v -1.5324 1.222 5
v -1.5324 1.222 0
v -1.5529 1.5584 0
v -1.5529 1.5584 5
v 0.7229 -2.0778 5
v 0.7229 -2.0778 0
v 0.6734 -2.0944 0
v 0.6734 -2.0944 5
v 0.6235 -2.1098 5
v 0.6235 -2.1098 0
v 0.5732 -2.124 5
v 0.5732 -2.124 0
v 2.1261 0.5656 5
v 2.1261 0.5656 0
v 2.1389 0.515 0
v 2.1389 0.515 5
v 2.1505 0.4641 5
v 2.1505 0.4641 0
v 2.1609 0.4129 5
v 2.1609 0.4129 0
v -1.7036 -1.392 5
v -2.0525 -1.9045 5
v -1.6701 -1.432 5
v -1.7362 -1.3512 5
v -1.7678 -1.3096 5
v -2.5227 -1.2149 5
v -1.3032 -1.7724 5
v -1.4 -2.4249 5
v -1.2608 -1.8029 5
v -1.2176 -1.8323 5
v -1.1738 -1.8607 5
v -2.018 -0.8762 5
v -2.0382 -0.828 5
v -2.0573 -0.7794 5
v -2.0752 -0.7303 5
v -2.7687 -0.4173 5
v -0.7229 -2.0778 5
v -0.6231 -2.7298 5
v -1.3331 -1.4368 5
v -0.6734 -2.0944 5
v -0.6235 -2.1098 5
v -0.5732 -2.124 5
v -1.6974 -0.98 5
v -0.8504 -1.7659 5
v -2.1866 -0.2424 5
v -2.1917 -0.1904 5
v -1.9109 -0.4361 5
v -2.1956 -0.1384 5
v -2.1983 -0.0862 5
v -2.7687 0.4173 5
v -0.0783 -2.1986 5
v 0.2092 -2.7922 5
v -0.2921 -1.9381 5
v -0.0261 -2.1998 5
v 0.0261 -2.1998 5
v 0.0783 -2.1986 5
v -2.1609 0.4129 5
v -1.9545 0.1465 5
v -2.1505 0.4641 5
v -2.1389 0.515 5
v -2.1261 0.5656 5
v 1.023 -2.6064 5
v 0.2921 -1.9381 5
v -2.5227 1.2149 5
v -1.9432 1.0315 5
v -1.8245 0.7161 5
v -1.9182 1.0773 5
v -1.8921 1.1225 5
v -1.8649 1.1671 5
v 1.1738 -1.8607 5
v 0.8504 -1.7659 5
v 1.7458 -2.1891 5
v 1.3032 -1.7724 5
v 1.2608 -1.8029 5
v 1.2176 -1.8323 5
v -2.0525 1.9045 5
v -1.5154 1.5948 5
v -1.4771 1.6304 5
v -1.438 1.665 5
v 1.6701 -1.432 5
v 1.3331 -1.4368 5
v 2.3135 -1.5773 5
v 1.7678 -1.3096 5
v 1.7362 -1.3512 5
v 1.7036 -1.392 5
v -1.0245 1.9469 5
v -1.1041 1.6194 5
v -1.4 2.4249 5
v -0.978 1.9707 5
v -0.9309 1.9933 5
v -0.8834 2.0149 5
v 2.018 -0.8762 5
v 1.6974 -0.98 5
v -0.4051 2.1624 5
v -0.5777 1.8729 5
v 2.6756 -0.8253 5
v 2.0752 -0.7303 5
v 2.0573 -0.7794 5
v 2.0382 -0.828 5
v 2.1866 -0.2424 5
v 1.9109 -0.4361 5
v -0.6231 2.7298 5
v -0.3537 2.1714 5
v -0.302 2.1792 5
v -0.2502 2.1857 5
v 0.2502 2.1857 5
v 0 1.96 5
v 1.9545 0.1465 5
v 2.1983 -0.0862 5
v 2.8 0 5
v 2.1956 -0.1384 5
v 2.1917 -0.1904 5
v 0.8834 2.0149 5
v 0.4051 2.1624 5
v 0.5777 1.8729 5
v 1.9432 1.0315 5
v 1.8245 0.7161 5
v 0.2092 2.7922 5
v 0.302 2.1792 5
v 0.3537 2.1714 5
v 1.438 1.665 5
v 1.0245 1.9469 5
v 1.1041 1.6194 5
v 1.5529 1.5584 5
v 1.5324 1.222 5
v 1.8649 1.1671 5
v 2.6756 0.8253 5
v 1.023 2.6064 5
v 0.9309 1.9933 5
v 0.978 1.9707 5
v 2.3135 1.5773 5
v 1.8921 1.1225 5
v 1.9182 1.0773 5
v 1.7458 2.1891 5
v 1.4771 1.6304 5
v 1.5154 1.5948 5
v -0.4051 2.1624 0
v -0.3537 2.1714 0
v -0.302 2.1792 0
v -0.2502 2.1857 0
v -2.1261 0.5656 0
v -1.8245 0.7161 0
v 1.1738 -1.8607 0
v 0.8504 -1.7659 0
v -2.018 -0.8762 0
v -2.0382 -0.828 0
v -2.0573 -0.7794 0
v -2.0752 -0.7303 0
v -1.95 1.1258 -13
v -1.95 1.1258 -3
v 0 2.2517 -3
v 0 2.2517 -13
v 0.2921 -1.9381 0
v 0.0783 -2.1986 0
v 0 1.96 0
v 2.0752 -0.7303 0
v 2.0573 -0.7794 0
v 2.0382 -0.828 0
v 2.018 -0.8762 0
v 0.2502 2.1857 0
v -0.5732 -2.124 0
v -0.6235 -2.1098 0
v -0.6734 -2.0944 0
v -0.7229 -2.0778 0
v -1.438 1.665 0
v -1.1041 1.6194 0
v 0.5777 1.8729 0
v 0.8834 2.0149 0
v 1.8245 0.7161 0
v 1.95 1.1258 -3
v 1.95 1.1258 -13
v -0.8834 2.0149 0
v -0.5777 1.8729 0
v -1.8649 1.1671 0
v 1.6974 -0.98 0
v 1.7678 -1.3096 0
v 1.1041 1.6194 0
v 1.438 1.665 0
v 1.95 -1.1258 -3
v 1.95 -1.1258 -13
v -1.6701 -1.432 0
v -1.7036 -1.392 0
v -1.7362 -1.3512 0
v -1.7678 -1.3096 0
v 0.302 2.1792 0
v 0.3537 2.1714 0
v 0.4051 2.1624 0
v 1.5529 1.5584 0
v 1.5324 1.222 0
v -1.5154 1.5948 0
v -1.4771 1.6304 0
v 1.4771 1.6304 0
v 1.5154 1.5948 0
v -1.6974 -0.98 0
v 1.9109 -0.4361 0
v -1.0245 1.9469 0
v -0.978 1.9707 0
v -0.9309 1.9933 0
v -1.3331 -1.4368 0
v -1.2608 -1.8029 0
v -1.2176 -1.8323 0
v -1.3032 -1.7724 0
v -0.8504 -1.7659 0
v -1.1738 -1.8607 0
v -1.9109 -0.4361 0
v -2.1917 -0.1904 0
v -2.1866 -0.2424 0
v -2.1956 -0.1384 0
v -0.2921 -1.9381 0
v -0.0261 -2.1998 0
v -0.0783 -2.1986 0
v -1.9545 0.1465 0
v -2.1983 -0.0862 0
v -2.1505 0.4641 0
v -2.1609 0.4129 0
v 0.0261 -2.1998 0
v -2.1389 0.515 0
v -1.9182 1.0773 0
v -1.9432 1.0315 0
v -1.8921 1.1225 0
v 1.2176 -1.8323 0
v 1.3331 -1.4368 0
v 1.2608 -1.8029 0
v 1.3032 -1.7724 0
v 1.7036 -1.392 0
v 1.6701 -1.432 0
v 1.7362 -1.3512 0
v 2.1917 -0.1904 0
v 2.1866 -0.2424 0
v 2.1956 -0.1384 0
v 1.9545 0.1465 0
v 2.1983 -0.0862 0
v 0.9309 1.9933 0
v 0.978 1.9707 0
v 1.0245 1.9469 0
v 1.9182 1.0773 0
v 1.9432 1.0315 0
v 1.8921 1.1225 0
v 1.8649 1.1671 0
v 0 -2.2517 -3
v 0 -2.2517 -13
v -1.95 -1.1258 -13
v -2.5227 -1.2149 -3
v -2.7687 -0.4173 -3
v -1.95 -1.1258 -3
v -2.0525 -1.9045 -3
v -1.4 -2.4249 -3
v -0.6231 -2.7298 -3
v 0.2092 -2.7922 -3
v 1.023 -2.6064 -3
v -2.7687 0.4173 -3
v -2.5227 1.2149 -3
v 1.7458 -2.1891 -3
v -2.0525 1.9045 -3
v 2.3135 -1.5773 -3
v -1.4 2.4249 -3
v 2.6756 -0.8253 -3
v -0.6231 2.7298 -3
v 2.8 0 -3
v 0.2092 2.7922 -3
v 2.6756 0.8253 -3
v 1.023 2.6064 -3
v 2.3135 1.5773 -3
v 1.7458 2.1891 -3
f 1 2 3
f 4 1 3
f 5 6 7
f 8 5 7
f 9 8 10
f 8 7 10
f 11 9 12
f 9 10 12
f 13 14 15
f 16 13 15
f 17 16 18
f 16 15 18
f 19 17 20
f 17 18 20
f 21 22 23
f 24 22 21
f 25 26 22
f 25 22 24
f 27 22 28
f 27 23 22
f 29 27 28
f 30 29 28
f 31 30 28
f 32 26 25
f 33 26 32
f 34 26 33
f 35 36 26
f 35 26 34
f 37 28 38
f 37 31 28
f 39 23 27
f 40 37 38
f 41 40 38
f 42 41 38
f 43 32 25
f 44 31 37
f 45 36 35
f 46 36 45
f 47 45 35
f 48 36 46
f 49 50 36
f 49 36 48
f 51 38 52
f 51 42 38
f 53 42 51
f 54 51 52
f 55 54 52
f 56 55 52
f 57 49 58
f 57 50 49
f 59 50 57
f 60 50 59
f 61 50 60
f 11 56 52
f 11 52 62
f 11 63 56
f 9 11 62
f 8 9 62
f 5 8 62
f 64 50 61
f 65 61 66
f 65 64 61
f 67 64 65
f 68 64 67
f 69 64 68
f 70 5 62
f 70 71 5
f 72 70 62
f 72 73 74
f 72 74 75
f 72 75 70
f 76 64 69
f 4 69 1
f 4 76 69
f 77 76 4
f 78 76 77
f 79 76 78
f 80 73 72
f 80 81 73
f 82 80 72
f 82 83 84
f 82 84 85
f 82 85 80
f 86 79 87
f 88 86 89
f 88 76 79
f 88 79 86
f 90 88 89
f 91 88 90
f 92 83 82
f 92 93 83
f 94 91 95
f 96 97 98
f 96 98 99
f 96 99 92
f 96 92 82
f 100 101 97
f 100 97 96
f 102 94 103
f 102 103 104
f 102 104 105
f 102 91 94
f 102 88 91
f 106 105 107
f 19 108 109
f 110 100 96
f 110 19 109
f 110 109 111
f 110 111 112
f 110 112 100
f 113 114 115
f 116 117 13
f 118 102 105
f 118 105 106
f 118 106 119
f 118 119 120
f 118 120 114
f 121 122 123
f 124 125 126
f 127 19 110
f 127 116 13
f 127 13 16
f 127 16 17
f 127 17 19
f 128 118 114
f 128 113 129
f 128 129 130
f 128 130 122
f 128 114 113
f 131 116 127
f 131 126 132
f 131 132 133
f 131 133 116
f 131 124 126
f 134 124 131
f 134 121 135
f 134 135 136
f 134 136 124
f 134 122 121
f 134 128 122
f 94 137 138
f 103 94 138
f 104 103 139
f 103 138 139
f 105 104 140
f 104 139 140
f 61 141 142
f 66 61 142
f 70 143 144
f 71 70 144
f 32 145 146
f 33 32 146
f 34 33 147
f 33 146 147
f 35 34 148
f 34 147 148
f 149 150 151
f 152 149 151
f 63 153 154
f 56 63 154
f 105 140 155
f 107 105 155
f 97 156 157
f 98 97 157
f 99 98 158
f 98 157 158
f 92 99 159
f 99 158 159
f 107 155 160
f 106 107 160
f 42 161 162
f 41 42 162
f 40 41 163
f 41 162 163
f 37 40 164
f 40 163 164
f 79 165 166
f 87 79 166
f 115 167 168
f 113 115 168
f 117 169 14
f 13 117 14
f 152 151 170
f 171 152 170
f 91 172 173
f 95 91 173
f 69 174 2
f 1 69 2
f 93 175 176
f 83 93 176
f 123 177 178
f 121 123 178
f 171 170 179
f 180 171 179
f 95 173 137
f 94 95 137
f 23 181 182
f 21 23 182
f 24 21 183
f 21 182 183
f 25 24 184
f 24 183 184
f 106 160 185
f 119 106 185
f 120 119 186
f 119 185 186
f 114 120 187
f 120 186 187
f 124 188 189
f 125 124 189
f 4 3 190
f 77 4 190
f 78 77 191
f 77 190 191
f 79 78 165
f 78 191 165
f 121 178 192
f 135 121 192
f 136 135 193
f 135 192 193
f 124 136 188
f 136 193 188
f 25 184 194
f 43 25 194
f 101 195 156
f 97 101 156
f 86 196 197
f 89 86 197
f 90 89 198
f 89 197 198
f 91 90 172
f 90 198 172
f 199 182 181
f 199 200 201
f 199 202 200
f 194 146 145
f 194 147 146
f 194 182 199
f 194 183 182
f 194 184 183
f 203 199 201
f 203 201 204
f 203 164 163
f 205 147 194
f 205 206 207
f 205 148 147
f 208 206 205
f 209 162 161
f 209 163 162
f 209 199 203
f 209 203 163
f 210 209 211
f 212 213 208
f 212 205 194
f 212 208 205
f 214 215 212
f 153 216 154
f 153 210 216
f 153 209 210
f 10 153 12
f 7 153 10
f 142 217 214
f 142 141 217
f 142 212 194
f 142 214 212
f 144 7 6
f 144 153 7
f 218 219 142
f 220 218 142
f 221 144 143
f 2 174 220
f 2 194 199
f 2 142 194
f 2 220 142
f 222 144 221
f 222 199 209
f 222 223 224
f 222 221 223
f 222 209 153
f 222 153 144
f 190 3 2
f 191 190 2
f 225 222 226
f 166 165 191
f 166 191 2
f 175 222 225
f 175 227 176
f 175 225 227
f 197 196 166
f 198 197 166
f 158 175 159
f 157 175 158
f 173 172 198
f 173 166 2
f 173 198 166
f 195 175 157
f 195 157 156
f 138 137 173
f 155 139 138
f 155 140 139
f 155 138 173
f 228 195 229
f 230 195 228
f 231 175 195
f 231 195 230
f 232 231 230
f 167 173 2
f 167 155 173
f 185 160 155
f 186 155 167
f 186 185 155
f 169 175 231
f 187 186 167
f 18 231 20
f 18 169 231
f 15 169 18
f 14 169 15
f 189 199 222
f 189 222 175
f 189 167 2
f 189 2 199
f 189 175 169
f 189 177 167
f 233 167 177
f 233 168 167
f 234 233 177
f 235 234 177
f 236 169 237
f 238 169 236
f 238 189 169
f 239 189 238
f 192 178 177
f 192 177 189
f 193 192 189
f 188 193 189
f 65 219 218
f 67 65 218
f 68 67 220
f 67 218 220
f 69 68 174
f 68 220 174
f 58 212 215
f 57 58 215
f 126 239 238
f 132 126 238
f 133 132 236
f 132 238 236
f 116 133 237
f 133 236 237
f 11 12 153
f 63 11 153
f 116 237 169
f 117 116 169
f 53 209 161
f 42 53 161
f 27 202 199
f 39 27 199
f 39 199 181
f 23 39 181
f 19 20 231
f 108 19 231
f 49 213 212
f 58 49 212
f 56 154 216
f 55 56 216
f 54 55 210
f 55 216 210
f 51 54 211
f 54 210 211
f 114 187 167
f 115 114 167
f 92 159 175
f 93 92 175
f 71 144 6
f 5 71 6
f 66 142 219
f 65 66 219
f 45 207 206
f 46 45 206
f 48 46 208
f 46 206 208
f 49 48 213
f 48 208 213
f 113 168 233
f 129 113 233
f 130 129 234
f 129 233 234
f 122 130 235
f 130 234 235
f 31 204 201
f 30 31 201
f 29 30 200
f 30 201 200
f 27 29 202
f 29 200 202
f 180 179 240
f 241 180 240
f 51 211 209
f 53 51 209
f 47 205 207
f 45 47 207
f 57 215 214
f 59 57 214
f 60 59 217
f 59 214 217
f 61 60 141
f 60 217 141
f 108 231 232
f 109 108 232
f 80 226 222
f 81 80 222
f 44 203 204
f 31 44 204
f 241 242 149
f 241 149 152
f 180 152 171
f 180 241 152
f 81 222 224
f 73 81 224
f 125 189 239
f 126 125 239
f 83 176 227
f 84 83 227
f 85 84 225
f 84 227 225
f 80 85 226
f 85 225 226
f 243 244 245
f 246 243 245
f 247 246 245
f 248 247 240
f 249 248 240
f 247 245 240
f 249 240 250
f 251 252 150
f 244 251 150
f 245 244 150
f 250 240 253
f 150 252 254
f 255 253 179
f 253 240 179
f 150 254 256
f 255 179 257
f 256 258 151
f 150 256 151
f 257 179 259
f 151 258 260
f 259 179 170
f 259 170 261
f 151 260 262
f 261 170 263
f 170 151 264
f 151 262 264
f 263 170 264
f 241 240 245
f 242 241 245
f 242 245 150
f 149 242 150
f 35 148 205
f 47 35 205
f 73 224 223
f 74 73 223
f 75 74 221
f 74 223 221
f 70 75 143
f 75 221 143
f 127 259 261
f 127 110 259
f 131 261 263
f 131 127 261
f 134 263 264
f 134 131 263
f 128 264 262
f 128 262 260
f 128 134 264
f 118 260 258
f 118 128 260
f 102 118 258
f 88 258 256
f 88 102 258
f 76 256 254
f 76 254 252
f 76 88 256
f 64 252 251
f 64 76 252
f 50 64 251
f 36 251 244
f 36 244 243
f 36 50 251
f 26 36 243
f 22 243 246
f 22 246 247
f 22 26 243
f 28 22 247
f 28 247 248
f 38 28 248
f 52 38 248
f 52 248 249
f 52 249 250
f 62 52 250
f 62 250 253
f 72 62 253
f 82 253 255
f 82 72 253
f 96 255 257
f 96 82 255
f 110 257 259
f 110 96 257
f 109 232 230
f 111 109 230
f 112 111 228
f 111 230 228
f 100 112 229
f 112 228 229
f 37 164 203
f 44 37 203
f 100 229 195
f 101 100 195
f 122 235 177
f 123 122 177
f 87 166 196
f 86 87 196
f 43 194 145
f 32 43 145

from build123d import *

# Parameters (mm, degrees)
F0_R     = 2.8
F1_DEPTH = 5
F2_DEPTH = 3
F4_DEPTH = 10


with BuildPart() as f1:
    # F0 (on Top) → F1 (new body)
    with BuildSketch(Plane.XY):
        Circle(F0_R)
        with BuildLine():
            ThreePointArc((-0.4051416179, 2.162373758), (-0.3278929856, 2.1754278177), (-0.2502285416, 2.1857231474))
            Line((-0.2502285416, 2.1857231474), (0, 1.96))
            Line((0, 1.96), (0.2502285416, 2.1857231474))
            ThreePointArc((0.2502285416, 2.1857231474), (0.3278929856, 2.1754278177), (0.4051416179, 2.162373758))
            Line((0.4051416179, 2.162373758), (0.5777201418, 1.8729226993))
            Line((0.5777201418, 1.8729226993), (0.8833647971, 2.0148614432))
            ThreePointArc((0.8833647971, 2.0148614432), (0.9545442261, 1.9821315094), (1.0245131668, 1.9468879709))
            Line((1.0245131668, 1.9468879709), (1.1041073138, 1.6194279977))
            Line((1.1041073138, 1.6194279977), (1.4380102138, 1.6649704577))
            ThreePointArc((1.4380102138, 1.6649704577), (1.4963800231, 1.612714118), (1.5528522248, 1.5584126437))
            Line((1.5528522248, 1.5584126437), (1.5323897056, 1.2220400116))
            Line((1.5323897056, 1.2220400116), (1.8648821124, 1.1671395404))
            ThreePointArc((1.8648821124, 1.1671395404), (1.9052558883, 1.1), (1.943213548, 1.0314655142))
            Line((1.943213548, 1.0314655142), (1.8245125473, 0.7160684078))
            Line((1.8245125473, 0.7160684078), (2.1260510514, 0.5656031531))
            ThreePointArc((2.1260510514, 0.5656031531), (2.1448414068, 0.4895460547), (2.1609118198, 0.4128681472))
            Line((2.1609118198, 0.4128681472), (1.9545194425, 0.1464709834))
            Line((1.9545194425, 0.1464709834), (2.1983110245, -0.0861895565))
            ThreePointArc((2.1983110245, -0.0861895565), (2.1938483538, -0.1644062059), (2.1866035935, -0.2424143665))
            Line((2.1866035935, -0.2424143665), (1.9108587079, -0.4361410306))
            Line((1.9108587079, -0.4361410306), (2.0752414159, -0.7303239458))
            ThreePointArc((2.0752414159, -0.7303239458), (2.047922247, -0.8037502536), (2.0180060421, -0.8761572999))
            Line((2.0180060421, -0.8761572999), (1.6974097914, -0.98))
            Line((1.6974097914, -0.98), (1.7677775005, -1.3095658475))
            ThreePointArc((1.7677775005, -1.3095658475), (1.7200292614, -1.3716775641), (1.670099798, -1.4320498123))
            Line((1.670099798, -1.4320498123), (1.333138566, -1.4367816688))
            Line((1.333138566, -1.4367816688), (1.3032387964, -1.7724470767))
            ThreePointArc((1.3032387964, -1.7724470767), (1.2393041277, -1.8177253035), (1.1737978577, -1.8606984144))
            Line((1.1737978577, -1.8606984144), (0.8504121287, -1.7658989811))
            Line((0.8504121287, -1.7658989811), (0.722901606, -2.0778386049))
            ThreePointArc((0.722901606, -2.0778386049), (0.6484613837, -2.1022601727), (0.5731988267, -2.1240157968))
            Line((0.5731988267, -2.1240157968), (0.2921228417, -1.9381084194))
            Line((0.2921228417, -1.9381084194), (0.0783314356, -2.1986050546))
            ThreePointArc((0.0783314356, -2.1986050546), (0, -2.2), (-0.0783314356, -2.1986050546))
            Line((-0.0783314356, -2.1986050546), (-0.2921228417, -1.9381084194))
            Line((-0.2921228417, -1.9381084194), (-0.5731988267, -2.1240157968))
            ThreePointArc((-0.5731988267, -2.1240157968), (-0.6484613837, -2.1022601727), (-0.722901606, -2.0778386049))
            Line((-0.722901606, -2.0778386049), (-0.8504121287, -1.7658989811))
            Line((-0.8504121287, -1.7658989811), (-1.1737978577, -1.8606984144))
            ThreePointArc((-1.1737978577, -1.8606984144), (-1.2393041277, -1.8177253035), (-1.3032387964, -1.7724470767))
            Line((-1.3032387964, -1.7724470767), (-1.333138566, -1.4367816688))
            Line((-1.333138566, -1.4367816688), (-1.670099798, -1.4320498123))
            ThreePointArc((-1.670099798, -1.4320498123), (-1.7200292614, -1.3716775641), (-1.7677775005, -1.3095658475))
            Line((-1.7677775005, -1.3095658475), (-1.6974097914, -0.98))
            Line((-1.6974097914, -0.98), (-2.0180060421, -0.8761572999))
            ThreePointArc((-2.0180060421, -0.8761572999), (-2.047922247, -0.8037502536), (-2.0752414159, -0.7303239458))
            Line((-2.0752414159, -0.7303239458), (-1.9108587079, -0.4361410306))
            Line((-1.9108587079, -0.4361410306), (-2.1866035935, -0.2424143665))
            ThreePointArc((-2.1866035935, -0.2424143665), (-2.1938483538, -0.1644062059), (-2.1983110245, -0.0861895565))
            Line((-2.1983110245, -0.0861895565), (-1.9545194425, 0.1464709834))
            Line((-1.9545194425, 0.1464709834), (-2.1609118198, 0.4128681472))
            ThreePointArc((-2.1609118198, 0.4128681472), (-2.1448414068, 0.4895460547), (-2.1260510514, 0.5656031531))
            Line((-2.1260510514, 0.5656031531), (-1.8245125473, 0.7160684078))
            Line((-1.8245125473, 0.7160684078), (-1.943213548, 1.0314655142))
            ThreePointArc((-1.943213548, 1.0314655142), (-1.9052558883, 1.1), (-1.8648821124, 1.1671395404))
            Line((-1.8648821124, 1.1671395404), (-1.5323897056, 1.2220400116))
            Line((-1.5323897056, 1.2220400116), (-1.5528522248, 1.5584126437))
            ThreePointArc((-1.5528522248, 1.5584126437), (-1.4963800231, 1.612714118), (-1.4380102138, 1.6649704577))
            Line((-1.4380102138, 1.6649704577), (-1.1041073138, 1.6194279977))
            Line((-1.1041073138, 1.6194279977), (-1.0245131668, 1.9468879709))
            ThreePointArc((-1.0245131668, 1.9468879709), (-0.9545442261, 1.9821315094), (-0.8833647971, 2.0148614432))
            Line((-0.8833647971, 2.0148614432), (-0.5777201418, 1.8729226993))
            Line((-0.5777201418, 1.8729226993), (-0.4051416179, 2.162373758))
        make_face(mode=Mode.SUBTRACT)
    extrude(amount=F1_DEPTH)

    # F0 (on Top) → F2 (join)
    with BuildSketch(Plane.XY):
        Circle(F0_R)
        with BuildLine():
            ThreePointArc((-0.4051416179, 2.162373758), (-0.3278929856, 2.1754278177), (-0.2502285416, 2.1857231474))
            Line((-0.2502285416, 2.1857231474), (0, 1.96))
            Line((0, 1.96), (0.2502285416, 2.1857231474))
            ThreePointArc((0.2502285416, 2.1857231474), (0.3278929856, 2.1754278177), (0.4051416179, 2.162373758))
            Line((0.4051416179, 2.162373758), (0.5777201418, 1.8729226993))
            Line((0.5777201418, 1.8729226993), (0.8833647971, 2.0148614432))
            ThreePointArc((0.8833647971, 2.0148614432), (0.9545442261, 1.9821315094), (1.0245131668, 1.9468879709))
            Line((1.0245131668, 1.9468879709), (1.1041073138, 1.6194279977))
            Line((1.1041073138, 1.6194279977), (1.4380102138, 1.6649704577))
            ThreePointArc((1.4380102138, 1.6649704577), (1.4963800231, 1.612714118), (1.5528522248, 1.5584126437))
            Line((1.5528522248, 1.5584126437), (1.5323897056, 1.2220400116))
            Line((1.5323897056, 1.2220400116), (1.8648821124, 1.1671395404))
            ThreePointArc((1.8648821124, 1.1671395404), (1.9052558883, 1.1), (1.943213548, 1.0314655142))
            Line((1.943213548, 1.0314655142), (1.8245125473, 0.7160684078))
            Line((1.8245125473, 0.7160684078), (2.1260510514, 0.5656031531))
            ThreePointArc((2.1260510514, 0.5656031531), (2.1448414068, 0.4895460547), (2.1609118198, 0.4128681472))
            Line((2.1609118198, 0.4128681472), (1.9545194425, 0.1464709834))
            Line((1.9545194425, 0.1464709834), (2.1983110245, -0.0861895565))
            ThreePointArc((2.1983110245, -0.0861895565), (2.1938483538, -0.1644062059), (2.1866035935, -0.2424143665))
            Line((2.1866035935, -0.2424143665), (1.9108587079, -0.4361410306))
            Line((1.9108587079, -0.4361410306), (2.0752414159, -0.7303239458))
            ThreePointArc((2.0752414159, -0.7303239458), (2.047922247, -0.8037502536), (2.0180060421, -0.8761572999))
            Line((2.0180060421, -0.8761572999), (1.6974097914, -0.98))
            Line((1.6974097914, -0.98), (1.7677775005, -1.3095658475))
            ThreePointArc((1.7677775005, -1.3095658475), (1.7200292614, -1.3716775641), (1.670099798, -1.4320498123))
            Line((1.670099798, -1.4320498123), (1.333138566, -1.4367816688))
            Line((1.333138566, -1.4367816688), (1.3032387964, -1.7724470767))
            ThreePointArc((1.3032387964, -1.7724470767), (1.2393041277, -1.8177253035), (1.1737978577, -1.8606984144))
            Line((1.1737978577, -1.8606984144), (0.8504121287, -1.7658989811))
            Line((0.8504121287, -1.7658989811), (0.722901606, -2.0778386049))
            ThreePointArc((0.722901606, -2.0778386049), (0.6484613837, -2.1022601727), (0.5731988267, -2.1240157968))
            Line((0.5731988267, -2.1240157968), (0.2921228417, -1.9381084194))
            Line((0.2921228417, -1.9381084194), (0.0783314356, -2.1986050546))
            ThreePointArc((0.0783314356, -2.1986050546), (0, -2.2), (-0.0783314356, -2.1986050546))
            Line((-0.0783314356, -2.1986050546), (-0.2921228417, -1.9381084194))
            Line((-0.2921228417, -1.9381084194), (-0.5731988267, -2.1240157968))
            ThreePointArc((-0.5731988267, -2.1240157968), (-0.6484613837, -2.1022601727), (-0.722901606, -2.0778386049))
            Line((-0.722901606, -2.0778386049), (-0.8504121287, -1.7658989811))
            Line((-0.8504121287, -1.7658989811), (-1.1737978577, -1.8606984144))
            ThreePointArc((-1.1737978577, -1.8606984144), (-1.2393041277, -1.8177253035), (-1.3032387964, -1.7724470767))
            Line((-1.3032387964, -1.7724470767), (-1.333138566, -1.4367816688))
            Line((-1.333138566, -1.4367816688), (-1.670099798, -1.4320498123))
            ThreePointArc((-1.670099798, -1.4320498123), (-1.7200292614, -1.3716775641), (-1.7677775005, -1.3095658475))
            Line((-1.7677775005, -1.3095658475), (-1.6974097914, -0.98))
            Line((-1.6974097914, -0.98), (-2.0180060421, -0.8761572999))
            ThreePointArc((-2.0180060421, -0.8761572999), (-2.047922247, -0.8037502536), (-2.0752414159, -0.7303239458))
            Line((-2.0752414159, -0.7303239458), (-1.9108587079, -0.4361410306))
            Line((-1.9108587079, -0.4361410306), (-2.1866035935, -0.2424143665))
            ThreePointArc((-2.1866035935, -0.2424143665), (-2.1938483538, -0.1644062059), (-2.1983110245, -0.0861895565))
            Line((-2.1983110245, -0.0861895565), (-1.9545194425, 0.1464709834))
            Line((-1.9545194425, 0.1464709834), (-2.1609118198, 0.4128681472))
            ThreePointArc((-2.1609118198, 0.4128681472), (-2.1448414068, 0.4895460547), (-2.1260510514, 0.5656031531))
            Line((-2.1260510514, 0.5656031531), (-1.8245125473, 0.7160684078))
            Line((-1.8245125473, 0.7160684078), (-1.943213548, 1.0314655142))
            ThreePointArc((-1.943213548, 1.0314655142), (-1.9052558883, 1.1), (-1.8648821124, 1.1671395404))
            Line((-1.8648821124, 1.1671395404), (-1.5323897056, 1.2220400116))
            Line((-1.5323897056, 1.2220400116), (-1.5528522248, 1.5584126437))
            ThreePointArc((-1.5528522248, 1.5584126437), (-1.4963800231, 1.612714118), (-1.4380102138, 1.6649704577))
            Line((-1.4380102138, 1.6649704577), (-1.1041073138, 1.6194279977))
            Line((-1.1041073138, 1.6194279977), (-1.0245131668, 1.9468879709))
            ThreePointArc((-1.0245131668, 1.9468879709), (-0.9545442261, 1.9821315094), (-0.8833647971, 2.0148614432))
            Line((-0.8833647971, 2.0148614432), (-0.5777201418, 1.8729226993))
            Line((-0.5777201418, 1.8729226993), (-0.4051416179, 2.162373758))
        make_face(mode=Mode.SUBTRACT)
        with BuildLine():
            Line((0, 1.96), (-0.2502285416, 2.1857231474))
            ThreePointArc((-0.2502285416, 2.1857231474), (-0.3278929856, 2.1754278177), (-0.4051416179, 2.162373758))
            Line((-0.4051416179, 2.162373758), (-0.5777201418, 1.8729226993))
            Line((-0.5777201418, 1.8729226993), (-0.8833647971, 2.0148614432))
            ThreePointArc((-0.8833647971, 2.0148614432), (-0.9545442261, 1.9821315094), (-1.0245131668, 1.9468879709))
            Line((-1.0245131668, 1.9468879709), (-1.1041073138, 1.6194279977))
            Line((-1.1041073138, 1.6194279977), (-1.4380102138, 1.6649704577))
            ThreePointArc((-1.4380102138, 1.6649704577), (-1.4963800231, 1.612714118), (-1.5528522248, 1.5584126437))
            Line((-1.5528522248, 1.5584126437), (-1.5323897056, 1.2220400116))
            Line((-1.5323897056, 1.2220400116), (-1.8648821124, 1.1671395404))
            ThreePointArc((-1.8648821124, 1.1671395404), (-1.9052558883, 1.1), (-1.943213548, 1.0314655142))
            Line((-1.943213548, 1.0314655142), (-1.8245125473, 0.7160684078))
            Line((-1.8245125473, 0.7160684078), (-2.1260510514, 0.5656031531))
            ThreePointArc((-2.1260510514, 0.5656031531), (-2.1448414068, 0.4895460547), (-2.1609118198, 0.4128681472))
            Line((-2.1609118198, 0.4128681472), (-1.9545194425, 0.1464709834))
            Line((-1.9545194425, 0.1464709834), (-2.1983110245, -0.0861895565))
            ThreePointArc((-2.1983110245, -0.0861895565), (-2.1938483538, -0.1644062059), (-2.1866035935, -0.2424143665))
            Line((-2.1866035935, -0.2424143665), (-1.9108587079, -0.4361410306))
            Line((-1.9108587079, -0.4361410306), (-2.0752414159, -0.7303239458))
            ThreePointArc((-2.0752414159, -0.7303239458), (-2.047922247, -0.8037502536), (-2.0180060421, -0.8761572999))
            Line((-2.0180060421, -0.8761572999), (-1.6974097914, -0.98))
            Line((-1.6974097914, -0.98), (-1.7677775005, -1.3095658475))
            ThreePointArc((-1.7677775005, -1.3095658475), (-1.7200292614, -1.3716775641), (-1.670099798, -1.4320498123))
            Line((-1.670099798, -1.4320498123), (-1.333138566, -1.4367816688))
            Line((-1.333138566, -1.4367816688), (-1.3032387964, -1.7724470767))
            ThreePointArc((-1.3032387964, -1.7724470767), (-1.2393041277, -1.8177253035), (-1.1737978577, -1.8606984144))
            Line((-1.1737978577, -1.8606984144), (-0.8504121287, -1.7658989811))
            Line((-0.8504121287, -1.7658989811), (-0.722901606, -2.0778386049))
            ThreePointArc((-0.722901606, -2.0778386049), (-0.6484613837, -2.1022601727), (-0.5731988267, -2.1240157968))
            Line((-0.5731988267, -2.1240157968), (-0.2921228417, -1.9381084194))
            Line((-0.2921228417, -1.9381084194), (-0.0783314356, -2.1986050546))
            ThreePointArc((-0.0783314356, -2.1986050546), (0, -2.2), (0.0783314356, -2.1986050546))
            Line((0.0783314356, -2.1986050546), (0.2921228417, -1.9381084194))
            Line((0.2921228417, -1.9381084194), (0.5731988267, -2.1240157968))
            ThreePointArc((0.5731988267, -2.1240157968), (0.6484613837, -2.1022601727), (0.722901606, -2.0778386049))
            Line((0.722901606, -2.0778386049), (0.8504121287, -1.7658989811))
            Line((0.8504121287, -1.7658989811), (1.1737978577, -1.8606984144))
            ThreePointArc((1.1737978577, -1.8606984144), (1.2393041277, -1.8177253035), (1.3032387964, -1.7724470767))
            Line((1.3032387964, -1.7724470767), (1.333138566, -1.4367816688))
            Line((1.333138566, -1.4367816688), (1.670099798, -1.4320498123))
            ThreePointArc((1.670099798, -1.4320498123), (1.7200292614, -1.3716775641), (1.7677775005, -1.3095658475))
            Line((1.7677775005, -1.3095658475), (1.6974097914, -0.98))
            Line((1.6974097914, -0.98), (2.0180060421, -0.8761572999))
            ThreePointArc((2.0180060421, -0.8761572999), (2.047922247, -0.8037502536), (2.0752414159, -0.7303239458))
            Line((2.0752414159, -0.7303239458), (1.9108587079, -0.4361410306))
            Line((1.9108587079, -0.4361410306), (2.1866035935, -0.2424143665))
            ThreePointArc((2.1866035935, -0.2424143665), (2.1938483538, -0.1644062059), (2.1983110245, -0.0861895565))
            Line((2.1983110245, -0.0861895565), (1.9545194425, 0.1464709834))
            Line((1.9545194425, 0.1464709834), (2.1609118198, 0.4128681472))
            ThreePointArc((2.1609118198, 0.4128681472), (2.1448414068, 0.4895460547), (2.1260510514, 0.5656031531))
            Line((2.1260510514, 0.5656031531), (1.8245125473, 0.7160684078))
            Line((1.8245125473, 0.7160684078), (1.943213548, 1.0314655142))
            ThreePointArc((1.943213548, 1.0314655142), (1.9052558883, 1.1), (1.8648821124, 1.1671395404))
            Line((1.8648821124, 1.1671395404), (1.5323897056, 1.2220400116))
            Line((1.5323897056, 1.2220400116), (1.5528522248, 1.5584126437))
            ThreePointArc((1.5528522248, 1.5584126437), (1.4963800231, 1.612714118), (1.4380102138, 1.6649704577))
            Line((1.4380102138, 1.6649704577), (1.1041073138, 1.6194279977))
            Line((1.1041073138, 1.6194279977), (1.0245131668, 1.9468879709))
            ThreePointArc((1.0245131668, 1.9468879709), (0.9545442261, 1.9821315094), (0.8833647971, 2.0148614432))
            Line((0.8833647971, 2.0148614432), (0.5777201418, 1.8729226993))
            Line((0.5777201418, 1.8729226993), (0.4051416179, 2.162373758))
            ThreePointArc((0.4051416179, 2.162373758), (0.3278929856, 2.1754278177), (0.2502285416, 2.1857231474))
            Line((0.2502285416, 2.1857231474), (0, 1.96))
        make_face()
    extrude(amount=-F2_DEPTH)

    # F3 (on face) → F4 (join)
    with BuildSketch(Plane(origin=(0, 0, -3), x_dir=(1, 0, 0), z_dir=(0, 0, -1))):
        Polygon((1.95, -1.1258330249), (1.95, 1.1258330249), (0, 2.2516660498), (-1.95, 1.1258330249), (-1.95, -1.1258330249), (0, -2.2516660498), align=None)
    extrude(amount=F4_DEPTH)


solid = f1.part
